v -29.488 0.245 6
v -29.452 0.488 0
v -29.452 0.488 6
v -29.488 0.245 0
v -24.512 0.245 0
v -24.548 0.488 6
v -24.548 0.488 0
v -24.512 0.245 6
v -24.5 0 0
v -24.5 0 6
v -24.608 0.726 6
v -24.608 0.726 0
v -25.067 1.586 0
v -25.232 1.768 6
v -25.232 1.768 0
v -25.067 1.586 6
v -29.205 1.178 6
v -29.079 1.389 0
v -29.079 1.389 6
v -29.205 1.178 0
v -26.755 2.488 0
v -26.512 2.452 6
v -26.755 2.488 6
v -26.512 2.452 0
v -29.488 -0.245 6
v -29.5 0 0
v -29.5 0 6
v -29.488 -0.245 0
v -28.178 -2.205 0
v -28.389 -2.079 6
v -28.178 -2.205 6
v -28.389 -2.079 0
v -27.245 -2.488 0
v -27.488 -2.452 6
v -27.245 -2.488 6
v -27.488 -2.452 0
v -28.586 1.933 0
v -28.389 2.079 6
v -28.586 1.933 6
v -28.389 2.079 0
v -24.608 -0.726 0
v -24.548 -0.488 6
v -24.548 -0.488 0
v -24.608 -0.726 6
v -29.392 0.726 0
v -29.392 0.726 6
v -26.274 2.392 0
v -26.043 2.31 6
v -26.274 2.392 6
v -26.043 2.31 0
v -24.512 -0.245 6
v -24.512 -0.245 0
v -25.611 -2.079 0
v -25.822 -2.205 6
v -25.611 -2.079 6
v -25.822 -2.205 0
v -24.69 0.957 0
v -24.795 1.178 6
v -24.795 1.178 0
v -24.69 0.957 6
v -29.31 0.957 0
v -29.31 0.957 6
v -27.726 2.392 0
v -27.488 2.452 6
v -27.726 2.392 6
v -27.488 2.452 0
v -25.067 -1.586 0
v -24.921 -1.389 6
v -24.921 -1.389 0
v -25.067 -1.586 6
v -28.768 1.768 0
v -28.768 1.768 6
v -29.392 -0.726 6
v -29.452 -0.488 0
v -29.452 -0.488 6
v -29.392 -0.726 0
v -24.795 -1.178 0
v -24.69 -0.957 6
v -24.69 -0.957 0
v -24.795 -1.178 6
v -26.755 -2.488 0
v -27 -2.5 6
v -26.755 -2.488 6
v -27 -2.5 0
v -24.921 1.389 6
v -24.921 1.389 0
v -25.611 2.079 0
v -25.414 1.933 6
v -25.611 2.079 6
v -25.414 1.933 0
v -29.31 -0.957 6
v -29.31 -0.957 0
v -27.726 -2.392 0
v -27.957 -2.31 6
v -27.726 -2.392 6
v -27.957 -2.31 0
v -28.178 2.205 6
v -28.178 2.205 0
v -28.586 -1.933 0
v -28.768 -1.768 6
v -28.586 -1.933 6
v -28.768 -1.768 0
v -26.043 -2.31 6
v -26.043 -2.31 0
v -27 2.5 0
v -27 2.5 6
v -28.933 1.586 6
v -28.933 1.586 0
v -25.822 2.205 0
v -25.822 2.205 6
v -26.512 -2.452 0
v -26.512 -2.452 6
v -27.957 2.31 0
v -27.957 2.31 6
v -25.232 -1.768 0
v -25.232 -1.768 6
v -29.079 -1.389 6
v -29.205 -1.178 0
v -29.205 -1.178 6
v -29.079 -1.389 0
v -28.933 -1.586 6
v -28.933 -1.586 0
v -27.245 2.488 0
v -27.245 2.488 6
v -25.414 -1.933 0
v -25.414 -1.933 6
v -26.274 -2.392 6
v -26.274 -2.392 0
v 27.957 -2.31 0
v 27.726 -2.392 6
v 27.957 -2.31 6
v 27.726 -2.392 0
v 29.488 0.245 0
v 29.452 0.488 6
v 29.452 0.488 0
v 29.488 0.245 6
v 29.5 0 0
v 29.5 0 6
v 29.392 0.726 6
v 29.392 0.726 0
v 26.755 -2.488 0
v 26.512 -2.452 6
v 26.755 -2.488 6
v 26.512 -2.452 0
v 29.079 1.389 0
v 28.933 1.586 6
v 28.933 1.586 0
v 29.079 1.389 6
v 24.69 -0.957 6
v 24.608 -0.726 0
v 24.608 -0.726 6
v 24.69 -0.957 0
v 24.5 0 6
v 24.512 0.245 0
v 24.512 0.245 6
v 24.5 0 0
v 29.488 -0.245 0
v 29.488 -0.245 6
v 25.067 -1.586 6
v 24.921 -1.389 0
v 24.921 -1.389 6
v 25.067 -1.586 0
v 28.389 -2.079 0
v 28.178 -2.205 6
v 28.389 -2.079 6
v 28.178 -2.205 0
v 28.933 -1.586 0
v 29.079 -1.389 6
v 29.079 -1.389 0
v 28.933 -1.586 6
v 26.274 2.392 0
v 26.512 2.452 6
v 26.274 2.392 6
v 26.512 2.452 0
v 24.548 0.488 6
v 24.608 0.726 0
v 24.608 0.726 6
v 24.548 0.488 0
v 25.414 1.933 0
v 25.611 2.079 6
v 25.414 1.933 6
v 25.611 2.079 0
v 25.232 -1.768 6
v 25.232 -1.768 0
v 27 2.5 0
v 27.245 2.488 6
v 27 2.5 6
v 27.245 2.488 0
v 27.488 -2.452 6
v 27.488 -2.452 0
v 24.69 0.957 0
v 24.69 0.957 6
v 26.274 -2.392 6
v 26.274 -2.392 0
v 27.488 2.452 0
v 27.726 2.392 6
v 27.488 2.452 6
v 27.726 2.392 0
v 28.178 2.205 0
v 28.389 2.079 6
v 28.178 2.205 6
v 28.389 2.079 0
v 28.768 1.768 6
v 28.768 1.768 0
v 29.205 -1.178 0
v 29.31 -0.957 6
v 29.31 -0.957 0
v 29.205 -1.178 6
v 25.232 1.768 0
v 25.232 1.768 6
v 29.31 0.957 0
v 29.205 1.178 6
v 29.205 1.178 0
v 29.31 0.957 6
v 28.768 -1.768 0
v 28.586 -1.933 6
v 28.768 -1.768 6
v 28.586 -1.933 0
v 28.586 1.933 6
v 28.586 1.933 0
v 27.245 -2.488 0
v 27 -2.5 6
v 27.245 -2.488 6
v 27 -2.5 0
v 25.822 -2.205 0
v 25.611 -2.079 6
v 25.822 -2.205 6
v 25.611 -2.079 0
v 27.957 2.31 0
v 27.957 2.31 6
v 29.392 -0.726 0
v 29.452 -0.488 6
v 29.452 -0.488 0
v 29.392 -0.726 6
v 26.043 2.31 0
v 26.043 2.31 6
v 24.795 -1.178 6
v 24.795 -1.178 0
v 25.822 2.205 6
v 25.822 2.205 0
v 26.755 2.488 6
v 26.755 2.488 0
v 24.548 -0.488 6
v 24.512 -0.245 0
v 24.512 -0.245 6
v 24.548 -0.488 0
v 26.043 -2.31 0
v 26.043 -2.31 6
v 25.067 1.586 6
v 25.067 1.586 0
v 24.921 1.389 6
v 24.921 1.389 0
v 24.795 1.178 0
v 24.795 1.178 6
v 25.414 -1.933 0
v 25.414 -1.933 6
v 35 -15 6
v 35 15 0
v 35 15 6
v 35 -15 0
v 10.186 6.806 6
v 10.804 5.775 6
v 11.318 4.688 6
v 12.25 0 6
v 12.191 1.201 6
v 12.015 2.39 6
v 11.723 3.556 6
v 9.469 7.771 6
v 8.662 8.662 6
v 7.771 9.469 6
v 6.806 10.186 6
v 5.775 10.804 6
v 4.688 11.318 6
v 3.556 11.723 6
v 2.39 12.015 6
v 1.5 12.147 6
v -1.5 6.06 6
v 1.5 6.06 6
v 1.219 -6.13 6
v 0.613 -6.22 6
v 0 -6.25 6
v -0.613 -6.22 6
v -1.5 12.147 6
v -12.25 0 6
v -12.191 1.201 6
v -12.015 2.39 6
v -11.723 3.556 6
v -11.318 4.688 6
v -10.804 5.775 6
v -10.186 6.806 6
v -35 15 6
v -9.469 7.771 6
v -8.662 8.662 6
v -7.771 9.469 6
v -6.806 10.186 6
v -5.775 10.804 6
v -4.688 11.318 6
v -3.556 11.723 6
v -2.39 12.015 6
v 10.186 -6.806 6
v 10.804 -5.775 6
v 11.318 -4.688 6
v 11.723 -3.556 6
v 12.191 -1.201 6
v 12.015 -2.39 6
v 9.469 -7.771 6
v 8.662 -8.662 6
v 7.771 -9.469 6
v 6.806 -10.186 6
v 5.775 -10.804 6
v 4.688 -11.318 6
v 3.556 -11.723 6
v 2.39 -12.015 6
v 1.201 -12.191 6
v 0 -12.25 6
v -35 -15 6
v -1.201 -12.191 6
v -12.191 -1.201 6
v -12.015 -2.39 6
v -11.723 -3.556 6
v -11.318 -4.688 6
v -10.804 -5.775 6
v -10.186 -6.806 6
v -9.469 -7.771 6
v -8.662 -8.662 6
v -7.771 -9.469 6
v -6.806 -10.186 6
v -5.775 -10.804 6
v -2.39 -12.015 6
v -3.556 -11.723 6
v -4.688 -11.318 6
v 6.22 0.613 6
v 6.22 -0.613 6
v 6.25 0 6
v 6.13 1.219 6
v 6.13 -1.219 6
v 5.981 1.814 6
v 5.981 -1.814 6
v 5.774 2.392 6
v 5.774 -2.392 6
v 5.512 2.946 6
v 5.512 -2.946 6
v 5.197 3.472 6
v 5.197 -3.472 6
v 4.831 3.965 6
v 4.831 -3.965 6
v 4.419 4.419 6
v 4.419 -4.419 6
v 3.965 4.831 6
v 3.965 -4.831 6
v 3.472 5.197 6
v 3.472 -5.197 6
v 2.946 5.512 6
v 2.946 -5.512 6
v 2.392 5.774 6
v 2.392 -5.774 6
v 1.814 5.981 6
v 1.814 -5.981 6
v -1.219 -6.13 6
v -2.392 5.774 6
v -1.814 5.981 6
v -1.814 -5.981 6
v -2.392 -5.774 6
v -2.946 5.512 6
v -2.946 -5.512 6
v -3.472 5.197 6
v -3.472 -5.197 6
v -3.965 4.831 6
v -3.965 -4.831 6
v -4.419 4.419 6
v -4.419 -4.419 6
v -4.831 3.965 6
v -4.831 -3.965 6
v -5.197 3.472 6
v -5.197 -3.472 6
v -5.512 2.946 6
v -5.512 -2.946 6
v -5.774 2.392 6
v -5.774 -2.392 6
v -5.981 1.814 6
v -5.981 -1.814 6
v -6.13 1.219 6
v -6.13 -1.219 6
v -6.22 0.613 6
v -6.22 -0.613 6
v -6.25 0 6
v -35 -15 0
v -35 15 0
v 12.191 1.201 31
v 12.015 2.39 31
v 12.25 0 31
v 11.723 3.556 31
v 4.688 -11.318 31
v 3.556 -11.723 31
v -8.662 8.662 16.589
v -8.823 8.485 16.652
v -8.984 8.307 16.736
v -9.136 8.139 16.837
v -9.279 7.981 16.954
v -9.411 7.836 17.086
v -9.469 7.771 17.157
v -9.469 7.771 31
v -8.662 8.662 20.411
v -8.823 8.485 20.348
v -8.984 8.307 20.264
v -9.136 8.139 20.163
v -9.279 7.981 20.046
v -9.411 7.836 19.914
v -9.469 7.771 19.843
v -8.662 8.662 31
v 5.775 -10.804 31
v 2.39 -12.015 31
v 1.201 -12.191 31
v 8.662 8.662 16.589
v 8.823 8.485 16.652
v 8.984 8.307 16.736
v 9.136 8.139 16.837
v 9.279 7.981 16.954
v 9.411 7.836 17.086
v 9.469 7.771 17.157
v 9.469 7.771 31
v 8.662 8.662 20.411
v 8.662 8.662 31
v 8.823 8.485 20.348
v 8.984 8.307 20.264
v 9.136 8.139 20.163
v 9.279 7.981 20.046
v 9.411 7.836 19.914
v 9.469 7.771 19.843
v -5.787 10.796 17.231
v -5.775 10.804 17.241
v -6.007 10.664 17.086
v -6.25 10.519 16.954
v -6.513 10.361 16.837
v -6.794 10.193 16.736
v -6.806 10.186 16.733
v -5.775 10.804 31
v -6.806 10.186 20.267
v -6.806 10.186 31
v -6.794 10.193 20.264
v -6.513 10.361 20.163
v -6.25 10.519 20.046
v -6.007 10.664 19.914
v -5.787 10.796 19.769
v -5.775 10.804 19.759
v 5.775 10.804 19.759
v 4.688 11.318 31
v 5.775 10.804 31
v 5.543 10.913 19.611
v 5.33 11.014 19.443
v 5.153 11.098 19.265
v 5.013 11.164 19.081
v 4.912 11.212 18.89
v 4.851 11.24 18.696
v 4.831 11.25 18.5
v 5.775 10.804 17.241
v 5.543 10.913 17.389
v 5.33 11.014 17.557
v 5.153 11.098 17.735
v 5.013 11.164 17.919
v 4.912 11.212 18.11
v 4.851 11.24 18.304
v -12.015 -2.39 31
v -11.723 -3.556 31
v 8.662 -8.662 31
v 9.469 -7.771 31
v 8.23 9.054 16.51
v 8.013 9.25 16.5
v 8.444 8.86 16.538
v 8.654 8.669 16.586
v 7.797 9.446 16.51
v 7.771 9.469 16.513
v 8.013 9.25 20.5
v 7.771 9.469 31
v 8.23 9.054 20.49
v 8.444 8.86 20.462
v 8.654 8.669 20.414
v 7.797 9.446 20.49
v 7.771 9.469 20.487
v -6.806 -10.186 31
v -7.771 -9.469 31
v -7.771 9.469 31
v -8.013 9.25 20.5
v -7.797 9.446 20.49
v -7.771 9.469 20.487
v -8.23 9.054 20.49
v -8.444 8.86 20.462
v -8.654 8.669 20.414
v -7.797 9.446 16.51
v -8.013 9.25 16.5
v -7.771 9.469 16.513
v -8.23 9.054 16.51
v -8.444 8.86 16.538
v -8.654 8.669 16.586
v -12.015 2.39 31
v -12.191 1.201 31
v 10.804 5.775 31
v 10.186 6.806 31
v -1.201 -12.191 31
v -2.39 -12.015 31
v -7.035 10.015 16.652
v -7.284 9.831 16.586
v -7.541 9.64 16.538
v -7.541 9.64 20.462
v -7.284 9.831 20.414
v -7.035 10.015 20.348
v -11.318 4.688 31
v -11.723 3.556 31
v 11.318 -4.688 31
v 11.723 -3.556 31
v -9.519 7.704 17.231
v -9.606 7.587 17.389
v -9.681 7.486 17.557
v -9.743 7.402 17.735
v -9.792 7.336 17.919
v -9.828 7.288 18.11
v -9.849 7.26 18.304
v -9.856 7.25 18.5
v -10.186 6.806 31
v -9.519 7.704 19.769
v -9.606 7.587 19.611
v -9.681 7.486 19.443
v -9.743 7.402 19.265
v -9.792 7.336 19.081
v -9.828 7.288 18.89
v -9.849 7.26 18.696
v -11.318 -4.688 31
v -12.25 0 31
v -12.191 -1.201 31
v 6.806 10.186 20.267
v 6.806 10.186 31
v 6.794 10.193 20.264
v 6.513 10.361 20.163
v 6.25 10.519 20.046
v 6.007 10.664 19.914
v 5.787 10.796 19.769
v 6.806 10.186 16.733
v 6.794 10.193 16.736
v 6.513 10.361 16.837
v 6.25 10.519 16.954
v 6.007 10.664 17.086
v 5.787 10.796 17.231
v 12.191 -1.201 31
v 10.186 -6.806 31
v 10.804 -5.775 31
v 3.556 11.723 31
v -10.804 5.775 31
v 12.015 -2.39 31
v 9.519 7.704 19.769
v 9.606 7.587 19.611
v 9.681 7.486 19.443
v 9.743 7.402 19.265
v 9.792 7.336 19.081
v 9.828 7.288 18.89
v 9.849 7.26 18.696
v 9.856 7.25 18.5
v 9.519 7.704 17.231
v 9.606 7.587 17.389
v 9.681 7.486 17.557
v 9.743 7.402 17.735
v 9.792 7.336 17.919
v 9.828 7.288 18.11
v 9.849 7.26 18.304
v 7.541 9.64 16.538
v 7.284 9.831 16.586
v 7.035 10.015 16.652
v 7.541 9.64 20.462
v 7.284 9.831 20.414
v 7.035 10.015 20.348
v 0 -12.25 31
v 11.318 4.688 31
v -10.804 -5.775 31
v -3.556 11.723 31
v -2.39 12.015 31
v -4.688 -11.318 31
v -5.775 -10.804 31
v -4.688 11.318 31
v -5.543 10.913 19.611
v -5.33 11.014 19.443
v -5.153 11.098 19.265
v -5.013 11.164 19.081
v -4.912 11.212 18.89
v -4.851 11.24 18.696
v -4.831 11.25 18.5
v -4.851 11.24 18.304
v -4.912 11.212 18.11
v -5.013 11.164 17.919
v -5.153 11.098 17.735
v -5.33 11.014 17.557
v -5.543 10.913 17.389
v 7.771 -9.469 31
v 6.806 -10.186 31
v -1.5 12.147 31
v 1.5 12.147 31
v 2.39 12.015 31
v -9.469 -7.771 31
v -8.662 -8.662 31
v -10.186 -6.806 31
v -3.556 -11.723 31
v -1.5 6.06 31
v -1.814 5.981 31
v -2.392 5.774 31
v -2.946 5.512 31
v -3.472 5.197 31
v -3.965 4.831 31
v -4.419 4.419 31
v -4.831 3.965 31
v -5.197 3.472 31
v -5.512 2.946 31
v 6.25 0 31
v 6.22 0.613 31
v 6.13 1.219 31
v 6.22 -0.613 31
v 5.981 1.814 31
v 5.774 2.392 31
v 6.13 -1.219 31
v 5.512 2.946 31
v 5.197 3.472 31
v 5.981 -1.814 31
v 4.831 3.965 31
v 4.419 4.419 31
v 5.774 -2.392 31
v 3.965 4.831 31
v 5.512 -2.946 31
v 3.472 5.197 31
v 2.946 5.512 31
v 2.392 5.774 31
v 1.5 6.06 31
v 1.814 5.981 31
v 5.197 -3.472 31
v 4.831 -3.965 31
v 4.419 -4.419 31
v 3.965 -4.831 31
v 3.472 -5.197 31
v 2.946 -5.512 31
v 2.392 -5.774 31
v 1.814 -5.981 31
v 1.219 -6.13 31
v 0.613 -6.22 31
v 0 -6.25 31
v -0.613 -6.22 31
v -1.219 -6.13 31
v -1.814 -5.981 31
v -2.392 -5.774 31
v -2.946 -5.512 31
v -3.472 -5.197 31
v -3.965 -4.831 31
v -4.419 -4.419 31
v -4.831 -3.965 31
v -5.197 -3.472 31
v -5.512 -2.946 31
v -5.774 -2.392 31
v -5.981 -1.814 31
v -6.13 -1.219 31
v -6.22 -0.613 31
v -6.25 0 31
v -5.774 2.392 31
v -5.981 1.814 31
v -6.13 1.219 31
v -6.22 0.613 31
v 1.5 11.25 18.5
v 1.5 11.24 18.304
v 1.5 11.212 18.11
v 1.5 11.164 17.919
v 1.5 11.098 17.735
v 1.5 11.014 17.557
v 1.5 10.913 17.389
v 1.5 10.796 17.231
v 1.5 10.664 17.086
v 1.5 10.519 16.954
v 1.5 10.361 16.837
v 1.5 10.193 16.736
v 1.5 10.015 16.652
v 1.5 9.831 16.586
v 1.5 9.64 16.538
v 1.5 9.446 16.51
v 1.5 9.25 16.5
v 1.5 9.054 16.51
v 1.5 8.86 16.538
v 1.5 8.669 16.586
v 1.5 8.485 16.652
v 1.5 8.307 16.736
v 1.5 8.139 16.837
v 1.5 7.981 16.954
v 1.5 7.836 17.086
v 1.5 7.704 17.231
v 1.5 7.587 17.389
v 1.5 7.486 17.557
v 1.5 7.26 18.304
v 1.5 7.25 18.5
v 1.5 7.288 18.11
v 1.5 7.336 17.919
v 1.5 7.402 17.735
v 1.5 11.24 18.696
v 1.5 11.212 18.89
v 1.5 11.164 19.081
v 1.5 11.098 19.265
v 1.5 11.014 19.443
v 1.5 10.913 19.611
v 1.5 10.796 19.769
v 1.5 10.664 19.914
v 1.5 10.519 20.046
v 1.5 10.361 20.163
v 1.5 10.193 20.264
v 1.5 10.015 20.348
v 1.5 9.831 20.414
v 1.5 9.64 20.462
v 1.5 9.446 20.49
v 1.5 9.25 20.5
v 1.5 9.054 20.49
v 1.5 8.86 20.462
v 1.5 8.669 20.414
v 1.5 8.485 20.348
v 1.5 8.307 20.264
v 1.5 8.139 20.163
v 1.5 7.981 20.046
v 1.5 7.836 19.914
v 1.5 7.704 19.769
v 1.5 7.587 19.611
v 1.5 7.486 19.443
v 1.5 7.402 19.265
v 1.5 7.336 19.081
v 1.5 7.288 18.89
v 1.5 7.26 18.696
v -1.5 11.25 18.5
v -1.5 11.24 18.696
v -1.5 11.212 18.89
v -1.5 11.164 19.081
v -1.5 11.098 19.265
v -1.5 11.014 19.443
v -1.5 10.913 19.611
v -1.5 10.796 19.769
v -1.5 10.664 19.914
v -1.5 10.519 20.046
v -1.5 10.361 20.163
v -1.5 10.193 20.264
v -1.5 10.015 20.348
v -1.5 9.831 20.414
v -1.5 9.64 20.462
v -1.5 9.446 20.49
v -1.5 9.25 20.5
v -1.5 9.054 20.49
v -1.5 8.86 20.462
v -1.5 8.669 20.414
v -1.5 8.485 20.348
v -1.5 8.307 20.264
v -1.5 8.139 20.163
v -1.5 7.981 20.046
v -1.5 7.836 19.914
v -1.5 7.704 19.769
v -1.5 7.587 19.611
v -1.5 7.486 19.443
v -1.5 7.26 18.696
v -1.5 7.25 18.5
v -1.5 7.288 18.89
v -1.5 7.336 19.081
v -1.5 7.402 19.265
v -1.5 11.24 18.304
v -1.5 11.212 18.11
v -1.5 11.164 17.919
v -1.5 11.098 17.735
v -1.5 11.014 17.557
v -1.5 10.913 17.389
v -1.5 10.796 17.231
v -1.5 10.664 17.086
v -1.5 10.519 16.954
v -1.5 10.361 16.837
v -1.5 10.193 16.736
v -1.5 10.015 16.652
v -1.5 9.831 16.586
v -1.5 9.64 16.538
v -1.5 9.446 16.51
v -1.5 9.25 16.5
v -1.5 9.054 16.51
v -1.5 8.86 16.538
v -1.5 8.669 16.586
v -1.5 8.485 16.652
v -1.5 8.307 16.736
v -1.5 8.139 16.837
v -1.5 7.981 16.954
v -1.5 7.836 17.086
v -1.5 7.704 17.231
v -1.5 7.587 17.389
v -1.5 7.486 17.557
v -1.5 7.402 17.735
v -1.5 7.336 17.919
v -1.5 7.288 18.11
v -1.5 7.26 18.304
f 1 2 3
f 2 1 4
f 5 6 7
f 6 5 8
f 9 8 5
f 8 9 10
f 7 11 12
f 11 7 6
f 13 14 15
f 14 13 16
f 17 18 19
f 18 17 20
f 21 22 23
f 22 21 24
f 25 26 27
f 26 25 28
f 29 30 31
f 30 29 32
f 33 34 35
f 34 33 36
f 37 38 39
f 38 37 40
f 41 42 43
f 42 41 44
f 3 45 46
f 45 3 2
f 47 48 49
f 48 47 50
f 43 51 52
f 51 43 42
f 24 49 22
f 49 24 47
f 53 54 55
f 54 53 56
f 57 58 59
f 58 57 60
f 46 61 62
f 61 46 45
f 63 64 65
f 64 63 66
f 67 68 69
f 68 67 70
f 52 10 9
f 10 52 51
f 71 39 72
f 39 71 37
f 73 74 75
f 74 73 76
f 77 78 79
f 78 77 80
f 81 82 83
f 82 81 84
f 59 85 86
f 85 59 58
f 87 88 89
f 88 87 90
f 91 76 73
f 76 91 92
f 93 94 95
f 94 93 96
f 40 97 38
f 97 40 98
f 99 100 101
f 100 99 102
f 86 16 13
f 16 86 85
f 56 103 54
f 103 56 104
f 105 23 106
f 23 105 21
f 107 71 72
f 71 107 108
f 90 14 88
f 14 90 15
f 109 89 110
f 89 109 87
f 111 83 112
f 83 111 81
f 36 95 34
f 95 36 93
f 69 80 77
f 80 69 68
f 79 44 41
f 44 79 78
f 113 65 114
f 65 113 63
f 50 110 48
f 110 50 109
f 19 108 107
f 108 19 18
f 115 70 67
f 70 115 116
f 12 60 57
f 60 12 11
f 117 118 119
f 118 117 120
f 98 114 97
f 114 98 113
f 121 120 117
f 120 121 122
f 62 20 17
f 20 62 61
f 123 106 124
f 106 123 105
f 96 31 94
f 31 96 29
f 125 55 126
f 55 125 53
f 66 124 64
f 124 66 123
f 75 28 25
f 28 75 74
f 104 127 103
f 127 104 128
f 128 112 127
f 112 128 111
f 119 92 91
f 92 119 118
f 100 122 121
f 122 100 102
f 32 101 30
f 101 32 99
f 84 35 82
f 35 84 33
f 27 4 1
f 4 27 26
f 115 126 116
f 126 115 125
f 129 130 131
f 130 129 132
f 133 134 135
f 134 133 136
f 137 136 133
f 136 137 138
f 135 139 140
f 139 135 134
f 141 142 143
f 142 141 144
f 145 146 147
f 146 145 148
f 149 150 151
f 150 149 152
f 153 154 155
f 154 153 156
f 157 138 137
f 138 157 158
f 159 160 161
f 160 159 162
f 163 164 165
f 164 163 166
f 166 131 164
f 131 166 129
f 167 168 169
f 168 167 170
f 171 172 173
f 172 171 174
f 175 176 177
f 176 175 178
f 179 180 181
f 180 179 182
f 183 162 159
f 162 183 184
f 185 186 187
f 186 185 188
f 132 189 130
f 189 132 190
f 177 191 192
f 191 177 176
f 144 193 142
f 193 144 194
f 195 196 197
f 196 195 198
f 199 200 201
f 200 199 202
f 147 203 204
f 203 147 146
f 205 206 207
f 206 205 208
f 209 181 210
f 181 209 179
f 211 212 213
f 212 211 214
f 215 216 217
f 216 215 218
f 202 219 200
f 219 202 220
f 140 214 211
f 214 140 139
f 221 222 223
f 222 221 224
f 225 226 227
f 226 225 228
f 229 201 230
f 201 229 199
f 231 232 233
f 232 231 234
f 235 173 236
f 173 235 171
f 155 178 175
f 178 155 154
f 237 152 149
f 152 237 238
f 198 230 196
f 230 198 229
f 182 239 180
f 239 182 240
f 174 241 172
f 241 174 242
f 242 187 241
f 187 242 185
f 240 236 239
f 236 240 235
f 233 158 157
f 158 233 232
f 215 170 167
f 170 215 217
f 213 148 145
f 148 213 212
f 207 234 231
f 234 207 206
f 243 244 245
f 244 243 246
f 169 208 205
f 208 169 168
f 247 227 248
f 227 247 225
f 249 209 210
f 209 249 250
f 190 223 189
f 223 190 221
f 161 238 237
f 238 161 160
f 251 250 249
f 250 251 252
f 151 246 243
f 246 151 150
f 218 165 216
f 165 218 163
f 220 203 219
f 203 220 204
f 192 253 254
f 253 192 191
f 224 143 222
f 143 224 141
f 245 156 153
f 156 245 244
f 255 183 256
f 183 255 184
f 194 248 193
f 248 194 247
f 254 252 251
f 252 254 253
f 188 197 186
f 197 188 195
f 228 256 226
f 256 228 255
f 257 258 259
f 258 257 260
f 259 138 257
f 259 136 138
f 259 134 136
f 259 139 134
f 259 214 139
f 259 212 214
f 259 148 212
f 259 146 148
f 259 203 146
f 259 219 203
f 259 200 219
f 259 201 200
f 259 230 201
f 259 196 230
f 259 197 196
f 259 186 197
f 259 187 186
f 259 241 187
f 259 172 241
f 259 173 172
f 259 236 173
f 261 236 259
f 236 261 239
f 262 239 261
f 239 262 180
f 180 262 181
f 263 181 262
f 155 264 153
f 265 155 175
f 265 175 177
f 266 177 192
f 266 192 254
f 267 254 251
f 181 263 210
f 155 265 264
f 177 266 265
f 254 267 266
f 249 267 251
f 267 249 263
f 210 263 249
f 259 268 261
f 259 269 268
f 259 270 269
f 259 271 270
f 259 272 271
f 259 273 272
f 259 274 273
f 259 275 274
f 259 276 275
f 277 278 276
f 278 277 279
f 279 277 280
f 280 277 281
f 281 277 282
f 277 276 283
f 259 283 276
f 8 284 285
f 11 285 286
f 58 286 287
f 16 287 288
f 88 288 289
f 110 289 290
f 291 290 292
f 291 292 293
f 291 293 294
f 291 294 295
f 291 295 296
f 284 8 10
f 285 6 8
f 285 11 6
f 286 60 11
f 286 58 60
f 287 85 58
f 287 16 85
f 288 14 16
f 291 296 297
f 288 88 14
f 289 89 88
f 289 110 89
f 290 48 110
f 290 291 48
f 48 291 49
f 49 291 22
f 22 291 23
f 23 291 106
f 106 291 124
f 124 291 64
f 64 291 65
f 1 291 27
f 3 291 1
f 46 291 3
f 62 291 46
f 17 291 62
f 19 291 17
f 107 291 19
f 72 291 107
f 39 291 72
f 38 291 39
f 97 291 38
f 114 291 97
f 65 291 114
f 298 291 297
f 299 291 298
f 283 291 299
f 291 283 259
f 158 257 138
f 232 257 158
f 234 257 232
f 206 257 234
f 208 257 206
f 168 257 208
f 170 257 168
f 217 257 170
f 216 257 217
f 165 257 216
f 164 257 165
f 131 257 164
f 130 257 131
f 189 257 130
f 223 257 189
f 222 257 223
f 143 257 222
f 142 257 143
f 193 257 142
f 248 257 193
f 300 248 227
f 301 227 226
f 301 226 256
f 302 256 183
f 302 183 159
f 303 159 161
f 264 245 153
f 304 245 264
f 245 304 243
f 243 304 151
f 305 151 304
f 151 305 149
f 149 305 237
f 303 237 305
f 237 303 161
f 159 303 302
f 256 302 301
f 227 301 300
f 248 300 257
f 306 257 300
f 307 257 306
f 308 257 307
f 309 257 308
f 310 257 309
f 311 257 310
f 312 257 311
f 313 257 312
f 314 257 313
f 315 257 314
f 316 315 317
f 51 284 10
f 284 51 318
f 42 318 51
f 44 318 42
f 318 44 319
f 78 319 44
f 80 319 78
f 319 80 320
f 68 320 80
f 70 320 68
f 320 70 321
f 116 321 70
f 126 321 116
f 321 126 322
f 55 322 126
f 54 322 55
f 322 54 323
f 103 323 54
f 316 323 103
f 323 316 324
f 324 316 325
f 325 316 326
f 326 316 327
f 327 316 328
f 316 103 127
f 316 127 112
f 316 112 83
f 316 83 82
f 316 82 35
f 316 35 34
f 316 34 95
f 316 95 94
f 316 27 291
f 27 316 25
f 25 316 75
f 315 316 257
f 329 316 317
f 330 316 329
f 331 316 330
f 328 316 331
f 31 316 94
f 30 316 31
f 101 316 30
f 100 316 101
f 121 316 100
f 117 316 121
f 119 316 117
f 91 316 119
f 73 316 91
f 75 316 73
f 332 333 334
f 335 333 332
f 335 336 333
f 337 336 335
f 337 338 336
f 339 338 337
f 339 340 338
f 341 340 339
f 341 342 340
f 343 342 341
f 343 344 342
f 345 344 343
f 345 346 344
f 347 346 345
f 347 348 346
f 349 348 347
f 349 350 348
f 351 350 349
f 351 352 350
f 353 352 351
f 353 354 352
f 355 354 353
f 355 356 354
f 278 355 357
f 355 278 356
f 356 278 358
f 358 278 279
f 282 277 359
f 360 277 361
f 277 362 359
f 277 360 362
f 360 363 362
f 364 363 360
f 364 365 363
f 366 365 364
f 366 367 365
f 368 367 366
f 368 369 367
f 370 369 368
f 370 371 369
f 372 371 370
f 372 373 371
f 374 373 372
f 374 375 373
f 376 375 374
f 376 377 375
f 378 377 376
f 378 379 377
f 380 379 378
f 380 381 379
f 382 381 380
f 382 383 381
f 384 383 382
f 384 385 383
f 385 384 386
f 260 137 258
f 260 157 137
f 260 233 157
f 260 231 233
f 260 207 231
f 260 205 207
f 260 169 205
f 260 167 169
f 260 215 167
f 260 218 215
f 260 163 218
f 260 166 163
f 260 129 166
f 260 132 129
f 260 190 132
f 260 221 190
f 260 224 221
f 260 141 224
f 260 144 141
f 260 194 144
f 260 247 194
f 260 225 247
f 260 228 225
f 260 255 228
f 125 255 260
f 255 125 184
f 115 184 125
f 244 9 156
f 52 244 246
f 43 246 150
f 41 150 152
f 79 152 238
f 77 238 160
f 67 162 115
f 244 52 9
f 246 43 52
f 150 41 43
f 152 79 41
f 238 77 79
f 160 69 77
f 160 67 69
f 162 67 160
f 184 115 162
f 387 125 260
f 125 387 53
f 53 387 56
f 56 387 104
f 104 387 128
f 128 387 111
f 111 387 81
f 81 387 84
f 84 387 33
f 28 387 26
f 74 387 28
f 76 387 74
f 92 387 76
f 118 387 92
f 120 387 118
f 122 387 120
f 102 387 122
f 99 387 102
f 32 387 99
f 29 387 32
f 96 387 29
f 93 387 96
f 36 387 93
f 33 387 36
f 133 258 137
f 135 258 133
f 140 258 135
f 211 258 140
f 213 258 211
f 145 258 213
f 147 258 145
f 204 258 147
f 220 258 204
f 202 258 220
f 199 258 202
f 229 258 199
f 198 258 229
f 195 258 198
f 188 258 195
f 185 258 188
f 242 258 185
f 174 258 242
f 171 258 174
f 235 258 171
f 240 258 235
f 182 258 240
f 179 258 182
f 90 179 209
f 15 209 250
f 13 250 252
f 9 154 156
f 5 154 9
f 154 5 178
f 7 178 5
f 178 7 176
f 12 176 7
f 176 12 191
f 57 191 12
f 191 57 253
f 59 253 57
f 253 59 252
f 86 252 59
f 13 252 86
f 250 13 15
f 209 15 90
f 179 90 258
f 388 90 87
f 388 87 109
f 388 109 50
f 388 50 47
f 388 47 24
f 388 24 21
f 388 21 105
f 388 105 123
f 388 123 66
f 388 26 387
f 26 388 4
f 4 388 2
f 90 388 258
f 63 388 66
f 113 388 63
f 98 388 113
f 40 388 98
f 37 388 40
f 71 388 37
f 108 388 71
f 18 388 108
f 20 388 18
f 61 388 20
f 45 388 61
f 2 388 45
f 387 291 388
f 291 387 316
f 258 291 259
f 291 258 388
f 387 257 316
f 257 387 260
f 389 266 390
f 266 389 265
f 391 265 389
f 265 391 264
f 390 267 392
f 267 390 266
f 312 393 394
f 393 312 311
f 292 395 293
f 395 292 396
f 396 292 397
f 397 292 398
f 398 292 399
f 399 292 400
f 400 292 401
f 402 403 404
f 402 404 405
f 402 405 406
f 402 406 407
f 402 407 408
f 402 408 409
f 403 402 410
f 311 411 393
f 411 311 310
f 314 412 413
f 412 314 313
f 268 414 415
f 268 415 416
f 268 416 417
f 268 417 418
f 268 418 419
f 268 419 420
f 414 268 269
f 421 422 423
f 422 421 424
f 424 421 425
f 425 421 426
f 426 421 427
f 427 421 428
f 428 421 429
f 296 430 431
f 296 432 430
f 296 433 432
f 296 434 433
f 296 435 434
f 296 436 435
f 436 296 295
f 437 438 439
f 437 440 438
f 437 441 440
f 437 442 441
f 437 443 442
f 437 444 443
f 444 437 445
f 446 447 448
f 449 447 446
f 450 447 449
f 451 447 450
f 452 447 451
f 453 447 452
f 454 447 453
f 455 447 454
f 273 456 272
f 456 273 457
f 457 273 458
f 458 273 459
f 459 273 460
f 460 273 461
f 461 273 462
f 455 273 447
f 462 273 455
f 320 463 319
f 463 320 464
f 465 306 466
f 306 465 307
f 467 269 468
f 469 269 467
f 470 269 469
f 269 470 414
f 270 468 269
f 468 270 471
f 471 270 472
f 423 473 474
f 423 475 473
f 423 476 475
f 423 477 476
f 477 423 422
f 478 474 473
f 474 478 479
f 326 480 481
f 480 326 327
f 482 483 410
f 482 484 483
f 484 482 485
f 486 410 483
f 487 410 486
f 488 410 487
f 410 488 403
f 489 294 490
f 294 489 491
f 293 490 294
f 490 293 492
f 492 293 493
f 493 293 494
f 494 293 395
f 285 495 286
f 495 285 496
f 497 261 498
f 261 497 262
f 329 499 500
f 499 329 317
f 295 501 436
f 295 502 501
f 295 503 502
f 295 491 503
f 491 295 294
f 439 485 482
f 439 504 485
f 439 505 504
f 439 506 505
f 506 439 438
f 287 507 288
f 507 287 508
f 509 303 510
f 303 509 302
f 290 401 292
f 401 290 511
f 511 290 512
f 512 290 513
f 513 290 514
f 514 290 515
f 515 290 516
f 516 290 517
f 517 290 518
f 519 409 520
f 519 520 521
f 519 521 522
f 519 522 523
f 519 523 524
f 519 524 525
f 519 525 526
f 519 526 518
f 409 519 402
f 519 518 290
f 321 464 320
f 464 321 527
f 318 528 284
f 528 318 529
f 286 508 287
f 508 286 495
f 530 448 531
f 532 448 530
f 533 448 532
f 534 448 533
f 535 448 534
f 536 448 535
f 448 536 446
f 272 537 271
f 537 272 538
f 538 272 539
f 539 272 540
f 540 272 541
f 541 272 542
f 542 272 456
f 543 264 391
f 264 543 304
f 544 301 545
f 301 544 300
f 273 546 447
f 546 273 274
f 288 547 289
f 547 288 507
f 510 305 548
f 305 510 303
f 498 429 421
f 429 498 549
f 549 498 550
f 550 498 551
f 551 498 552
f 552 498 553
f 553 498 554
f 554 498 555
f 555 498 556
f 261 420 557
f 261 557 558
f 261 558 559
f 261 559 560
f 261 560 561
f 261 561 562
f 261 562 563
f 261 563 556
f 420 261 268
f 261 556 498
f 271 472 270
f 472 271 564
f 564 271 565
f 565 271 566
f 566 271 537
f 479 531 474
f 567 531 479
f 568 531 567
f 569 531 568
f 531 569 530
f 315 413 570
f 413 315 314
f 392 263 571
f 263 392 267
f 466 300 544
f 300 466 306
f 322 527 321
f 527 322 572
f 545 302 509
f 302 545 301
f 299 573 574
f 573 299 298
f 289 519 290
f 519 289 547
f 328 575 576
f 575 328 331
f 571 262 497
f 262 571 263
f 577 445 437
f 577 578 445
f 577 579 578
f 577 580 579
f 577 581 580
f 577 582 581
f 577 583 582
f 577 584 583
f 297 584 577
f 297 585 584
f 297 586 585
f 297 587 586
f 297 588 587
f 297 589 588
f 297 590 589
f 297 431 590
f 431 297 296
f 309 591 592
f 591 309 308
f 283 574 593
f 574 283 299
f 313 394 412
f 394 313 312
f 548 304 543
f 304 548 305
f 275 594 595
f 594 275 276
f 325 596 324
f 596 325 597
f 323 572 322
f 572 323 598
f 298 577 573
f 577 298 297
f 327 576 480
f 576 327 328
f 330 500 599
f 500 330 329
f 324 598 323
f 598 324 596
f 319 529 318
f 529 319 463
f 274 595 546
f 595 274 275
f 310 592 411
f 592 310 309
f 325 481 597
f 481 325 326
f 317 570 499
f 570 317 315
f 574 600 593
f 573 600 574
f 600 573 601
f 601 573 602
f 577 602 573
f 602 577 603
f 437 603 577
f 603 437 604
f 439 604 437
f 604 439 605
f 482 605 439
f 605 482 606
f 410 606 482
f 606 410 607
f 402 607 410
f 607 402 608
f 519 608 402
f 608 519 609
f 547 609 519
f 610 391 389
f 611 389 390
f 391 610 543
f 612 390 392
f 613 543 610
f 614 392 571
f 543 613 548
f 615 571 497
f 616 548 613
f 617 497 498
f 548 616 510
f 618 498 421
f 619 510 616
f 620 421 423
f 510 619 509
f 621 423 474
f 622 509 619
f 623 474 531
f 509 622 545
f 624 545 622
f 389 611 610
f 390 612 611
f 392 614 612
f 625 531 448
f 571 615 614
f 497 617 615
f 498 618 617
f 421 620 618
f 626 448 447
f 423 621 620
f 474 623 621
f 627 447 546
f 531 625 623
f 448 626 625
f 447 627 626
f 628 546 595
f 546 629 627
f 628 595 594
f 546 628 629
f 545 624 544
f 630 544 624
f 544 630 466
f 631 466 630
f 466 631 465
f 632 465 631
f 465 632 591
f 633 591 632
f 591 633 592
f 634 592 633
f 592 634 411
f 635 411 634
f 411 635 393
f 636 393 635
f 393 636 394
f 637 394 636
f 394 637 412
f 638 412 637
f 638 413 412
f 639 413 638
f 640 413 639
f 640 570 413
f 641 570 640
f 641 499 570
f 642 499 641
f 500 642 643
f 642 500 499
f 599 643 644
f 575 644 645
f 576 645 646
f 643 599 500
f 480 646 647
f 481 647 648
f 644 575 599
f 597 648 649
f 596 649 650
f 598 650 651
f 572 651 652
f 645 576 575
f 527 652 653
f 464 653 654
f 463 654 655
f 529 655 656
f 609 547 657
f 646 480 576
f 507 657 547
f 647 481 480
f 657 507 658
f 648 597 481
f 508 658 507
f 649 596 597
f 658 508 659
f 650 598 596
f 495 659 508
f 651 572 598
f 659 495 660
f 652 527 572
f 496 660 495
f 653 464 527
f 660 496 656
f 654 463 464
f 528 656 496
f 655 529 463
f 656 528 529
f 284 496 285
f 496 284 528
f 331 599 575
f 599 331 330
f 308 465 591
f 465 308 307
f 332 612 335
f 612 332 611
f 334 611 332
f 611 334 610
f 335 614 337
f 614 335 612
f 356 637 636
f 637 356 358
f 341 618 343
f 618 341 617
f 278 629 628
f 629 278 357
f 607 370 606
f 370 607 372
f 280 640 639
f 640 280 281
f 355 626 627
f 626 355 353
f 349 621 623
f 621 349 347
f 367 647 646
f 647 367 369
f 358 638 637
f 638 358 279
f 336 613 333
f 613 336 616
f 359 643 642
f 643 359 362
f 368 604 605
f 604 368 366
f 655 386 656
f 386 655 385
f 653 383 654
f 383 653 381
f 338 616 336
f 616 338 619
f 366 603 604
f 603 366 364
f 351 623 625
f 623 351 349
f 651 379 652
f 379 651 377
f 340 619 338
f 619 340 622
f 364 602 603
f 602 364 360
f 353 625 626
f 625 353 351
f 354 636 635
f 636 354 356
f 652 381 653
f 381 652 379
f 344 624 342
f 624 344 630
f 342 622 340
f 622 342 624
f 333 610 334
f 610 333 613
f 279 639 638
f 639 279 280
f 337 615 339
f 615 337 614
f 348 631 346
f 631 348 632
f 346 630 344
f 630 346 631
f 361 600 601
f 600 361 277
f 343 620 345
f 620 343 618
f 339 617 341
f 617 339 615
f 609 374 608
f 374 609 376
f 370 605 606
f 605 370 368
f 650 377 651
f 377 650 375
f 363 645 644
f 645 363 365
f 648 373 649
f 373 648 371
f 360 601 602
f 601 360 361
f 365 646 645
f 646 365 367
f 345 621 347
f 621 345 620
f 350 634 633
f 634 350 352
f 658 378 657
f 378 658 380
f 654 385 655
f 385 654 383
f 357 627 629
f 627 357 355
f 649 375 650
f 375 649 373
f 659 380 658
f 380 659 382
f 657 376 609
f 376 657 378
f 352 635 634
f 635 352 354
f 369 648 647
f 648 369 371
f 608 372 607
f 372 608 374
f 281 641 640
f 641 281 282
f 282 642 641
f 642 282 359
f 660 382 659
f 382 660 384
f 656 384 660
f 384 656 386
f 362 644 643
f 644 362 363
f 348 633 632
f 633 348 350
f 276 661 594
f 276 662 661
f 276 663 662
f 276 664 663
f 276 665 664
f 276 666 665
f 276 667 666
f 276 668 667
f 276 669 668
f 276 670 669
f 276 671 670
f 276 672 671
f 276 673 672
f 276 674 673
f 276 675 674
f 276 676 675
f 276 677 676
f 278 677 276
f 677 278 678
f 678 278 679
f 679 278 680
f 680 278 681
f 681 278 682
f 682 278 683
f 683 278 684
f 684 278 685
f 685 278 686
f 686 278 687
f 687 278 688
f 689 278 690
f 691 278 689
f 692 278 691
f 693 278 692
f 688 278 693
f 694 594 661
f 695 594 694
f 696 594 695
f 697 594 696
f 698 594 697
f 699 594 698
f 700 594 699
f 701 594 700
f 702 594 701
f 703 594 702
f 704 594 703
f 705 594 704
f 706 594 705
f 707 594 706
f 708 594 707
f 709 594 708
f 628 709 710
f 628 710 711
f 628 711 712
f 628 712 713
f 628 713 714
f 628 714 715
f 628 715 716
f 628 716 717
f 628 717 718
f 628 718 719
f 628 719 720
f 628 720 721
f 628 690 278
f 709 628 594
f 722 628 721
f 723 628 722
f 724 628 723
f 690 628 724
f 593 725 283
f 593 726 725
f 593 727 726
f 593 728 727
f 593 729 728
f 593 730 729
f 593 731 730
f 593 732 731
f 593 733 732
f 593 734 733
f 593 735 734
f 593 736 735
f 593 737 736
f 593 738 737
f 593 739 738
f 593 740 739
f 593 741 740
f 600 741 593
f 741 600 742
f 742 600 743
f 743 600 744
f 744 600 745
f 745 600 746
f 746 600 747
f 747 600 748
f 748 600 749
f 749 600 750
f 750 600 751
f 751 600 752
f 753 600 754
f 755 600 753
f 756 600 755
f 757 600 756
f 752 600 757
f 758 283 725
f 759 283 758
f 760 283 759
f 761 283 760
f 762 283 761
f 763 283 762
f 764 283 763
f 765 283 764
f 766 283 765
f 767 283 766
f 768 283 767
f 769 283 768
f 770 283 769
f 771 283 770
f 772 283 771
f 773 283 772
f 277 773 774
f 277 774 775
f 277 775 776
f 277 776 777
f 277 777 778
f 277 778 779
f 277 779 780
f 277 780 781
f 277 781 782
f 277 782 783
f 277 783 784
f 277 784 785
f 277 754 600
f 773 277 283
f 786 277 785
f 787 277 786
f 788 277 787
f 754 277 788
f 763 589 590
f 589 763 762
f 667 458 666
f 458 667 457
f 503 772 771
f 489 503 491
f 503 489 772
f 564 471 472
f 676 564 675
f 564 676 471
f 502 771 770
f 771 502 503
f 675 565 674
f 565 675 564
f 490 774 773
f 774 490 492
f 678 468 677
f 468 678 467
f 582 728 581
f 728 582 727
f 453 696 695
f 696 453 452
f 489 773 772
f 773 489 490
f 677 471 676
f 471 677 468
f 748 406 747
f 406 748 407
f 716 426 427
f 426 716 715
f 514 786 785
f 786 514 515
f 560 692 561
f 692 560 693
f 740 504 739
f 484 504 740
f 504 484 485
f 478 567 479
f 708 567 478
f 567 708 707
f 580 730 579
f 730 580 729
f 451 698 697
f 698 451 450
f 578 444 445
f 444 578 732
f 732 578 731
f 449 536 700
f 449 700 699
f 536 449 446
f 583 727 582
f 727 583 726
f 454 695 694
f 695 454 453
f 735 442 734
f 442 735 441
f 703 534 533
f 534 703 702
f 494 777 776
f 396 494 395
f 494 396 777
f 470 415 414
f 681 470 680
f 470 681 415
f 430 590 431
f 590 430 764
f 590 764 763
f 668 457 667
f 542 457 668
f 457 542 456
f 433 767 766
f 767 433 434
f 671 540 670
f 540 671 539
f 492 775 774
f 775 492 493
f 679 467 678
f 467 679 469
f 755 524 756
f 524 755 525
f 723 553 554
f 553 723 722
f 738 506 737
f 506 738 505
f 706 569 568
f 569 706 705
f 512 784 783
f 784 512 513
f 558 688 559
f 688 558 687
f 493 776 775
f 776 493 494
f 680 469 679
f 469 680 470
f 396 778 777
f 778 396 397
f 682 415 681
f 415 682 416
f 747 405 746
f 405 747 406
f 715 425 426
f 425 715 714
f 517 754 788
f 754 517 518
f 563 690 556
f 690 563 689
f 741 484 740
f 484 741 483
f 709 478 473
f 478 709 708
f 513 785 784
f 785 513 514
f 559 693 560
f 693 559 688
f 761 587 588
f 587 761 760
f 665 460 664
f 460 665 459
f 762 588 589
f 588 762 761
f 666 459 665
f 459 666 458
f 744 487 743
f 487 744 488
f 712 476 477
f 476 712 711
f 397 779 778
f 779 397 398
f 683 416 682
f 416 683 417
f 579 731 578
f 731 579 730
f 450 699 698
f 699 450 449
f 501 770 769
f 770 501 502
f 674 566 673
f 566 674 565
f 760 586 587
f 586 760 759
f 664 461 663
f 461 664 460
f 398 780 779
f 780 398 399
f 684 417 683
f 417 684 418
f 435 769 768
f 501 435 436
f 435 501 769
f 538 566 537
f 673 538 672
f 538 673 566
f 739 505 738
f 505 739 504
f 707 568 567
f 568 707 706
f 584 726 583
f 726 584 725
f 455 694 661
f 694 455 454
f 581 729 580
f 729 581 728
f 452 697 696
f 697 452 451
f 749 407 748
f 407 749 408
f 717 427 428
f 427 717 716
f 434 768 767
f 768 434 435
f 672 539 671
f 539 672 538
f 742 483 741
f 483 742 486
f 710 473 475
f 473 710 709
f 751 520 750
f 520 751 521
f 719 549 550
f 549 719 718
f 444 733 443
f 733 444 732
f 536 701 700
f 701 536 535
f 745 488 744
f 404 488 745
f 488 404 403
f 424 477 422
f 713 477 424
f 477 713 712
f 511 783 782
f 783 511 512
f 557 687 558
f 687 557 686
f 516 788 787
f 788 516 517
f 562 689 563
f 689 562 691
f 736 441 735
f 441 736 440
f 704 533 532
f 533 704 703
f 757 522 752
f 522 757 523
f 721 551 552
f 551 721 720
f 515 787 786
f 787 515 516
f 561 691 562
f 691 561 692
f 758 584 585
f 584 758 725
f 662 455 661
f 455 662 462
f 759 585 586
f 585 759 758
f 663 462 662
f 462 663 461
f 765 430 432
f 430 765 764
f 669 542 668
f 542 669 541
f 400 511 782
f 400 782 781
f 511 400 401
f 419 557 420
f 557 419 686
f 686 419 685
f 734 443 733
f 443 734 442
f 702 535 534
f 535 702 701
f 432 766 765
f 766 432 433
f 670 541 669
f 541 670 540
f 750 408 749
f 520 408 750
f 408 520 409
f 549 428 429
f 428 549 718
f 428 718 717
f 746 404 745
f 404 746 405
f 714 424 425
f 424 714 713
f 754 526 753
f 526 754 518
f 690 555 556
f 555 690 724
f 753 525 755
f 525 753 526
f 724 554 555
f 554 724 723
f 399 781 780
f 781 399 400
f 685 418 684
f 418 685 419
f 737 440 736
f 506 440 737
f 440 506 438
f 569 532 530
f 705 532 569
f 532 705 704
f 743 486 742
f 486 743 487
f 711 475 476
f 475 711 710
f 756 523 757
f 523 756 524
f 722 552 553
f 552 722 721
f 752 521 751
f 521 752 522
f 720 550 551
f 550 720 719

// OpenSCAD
// ============ SOPORTE DE VARILLA ============
// Abrazadera partida con base atornillable para
// sujetar una varilla vertical de laboratorio.

/* [Varilla] */
// Diámetro de la varilla (mm)
diametro_varilla = 12.5; // [4:0.5:30]
// Altura de la abrazadera (mm)
altura_abrazadera = 25; // [10:60]
// Espesor de pared alrededor de la varilla (mm)
pared = 6; // [3:15]
// Ancho de la ranura de apriete (mm)
ranura = 3; // [1:8]
// Diámetro del tornillo de apriete (mm)
tornillo_apriete = 4; // [2:8]

/* [Base] */
// Largo de la base (mm)
base_largo = 70; // [40:140]
// Ancho de la base (mm)
base_ancho = 30; // [20:60]
// Espesor de la base (mm)
base_espesor = 6; // [4:15]
// Diámetro de los tornillos de fijación (mm)
tornillo_base = 5; // [3:8]

/* [Calidad] */
// Resolución de las curvas
resolucion = 64; // [24:160]

/* [Hidden] */
$fn = resolucion;
d_ext = diametro_varilla + 2 * pared;

// Base con agujeros de fijación
difference() {
    translate([0, 0, base_espesor / 2])
        cube([base_largo, base_ancho, base_espesor], center = true);
    for (x = [-1, 1])
        translate([x * (base_largo / 2 - tornillo_base * 1.6), 0, base_espesor / 2])
            cylinder(h = base_espesor + 2, d = tornillo_base, center = true);
}

// Abrazadera partida
translate([0, 0, base_espesor])
difference() {
    cylinder(h = altura_abrazadera, d = d_ext);
    // Alojamiento de la varilla (apoya sobre la base)
    translate([0, 0, -1])
        cylinder(h = altura_abrazadera + 2, d = diametro_varilla);
    // Ranura de apriete
    translate([0, d_ext / 2, altura_abrazadera / 2])
        cube([ranura, d_ext, altura_abrazadera + 2], center = true);
    // Tornillo de apriete, atraviesa la ranura
    translate([0, diametro_varilla / 2 + pared / 2, altura_abrazadera / 2])
        rotate([0, 90, 0])
            cylinder(h = d_ext + 2, d = tornillo_apriete, center = true);
}
